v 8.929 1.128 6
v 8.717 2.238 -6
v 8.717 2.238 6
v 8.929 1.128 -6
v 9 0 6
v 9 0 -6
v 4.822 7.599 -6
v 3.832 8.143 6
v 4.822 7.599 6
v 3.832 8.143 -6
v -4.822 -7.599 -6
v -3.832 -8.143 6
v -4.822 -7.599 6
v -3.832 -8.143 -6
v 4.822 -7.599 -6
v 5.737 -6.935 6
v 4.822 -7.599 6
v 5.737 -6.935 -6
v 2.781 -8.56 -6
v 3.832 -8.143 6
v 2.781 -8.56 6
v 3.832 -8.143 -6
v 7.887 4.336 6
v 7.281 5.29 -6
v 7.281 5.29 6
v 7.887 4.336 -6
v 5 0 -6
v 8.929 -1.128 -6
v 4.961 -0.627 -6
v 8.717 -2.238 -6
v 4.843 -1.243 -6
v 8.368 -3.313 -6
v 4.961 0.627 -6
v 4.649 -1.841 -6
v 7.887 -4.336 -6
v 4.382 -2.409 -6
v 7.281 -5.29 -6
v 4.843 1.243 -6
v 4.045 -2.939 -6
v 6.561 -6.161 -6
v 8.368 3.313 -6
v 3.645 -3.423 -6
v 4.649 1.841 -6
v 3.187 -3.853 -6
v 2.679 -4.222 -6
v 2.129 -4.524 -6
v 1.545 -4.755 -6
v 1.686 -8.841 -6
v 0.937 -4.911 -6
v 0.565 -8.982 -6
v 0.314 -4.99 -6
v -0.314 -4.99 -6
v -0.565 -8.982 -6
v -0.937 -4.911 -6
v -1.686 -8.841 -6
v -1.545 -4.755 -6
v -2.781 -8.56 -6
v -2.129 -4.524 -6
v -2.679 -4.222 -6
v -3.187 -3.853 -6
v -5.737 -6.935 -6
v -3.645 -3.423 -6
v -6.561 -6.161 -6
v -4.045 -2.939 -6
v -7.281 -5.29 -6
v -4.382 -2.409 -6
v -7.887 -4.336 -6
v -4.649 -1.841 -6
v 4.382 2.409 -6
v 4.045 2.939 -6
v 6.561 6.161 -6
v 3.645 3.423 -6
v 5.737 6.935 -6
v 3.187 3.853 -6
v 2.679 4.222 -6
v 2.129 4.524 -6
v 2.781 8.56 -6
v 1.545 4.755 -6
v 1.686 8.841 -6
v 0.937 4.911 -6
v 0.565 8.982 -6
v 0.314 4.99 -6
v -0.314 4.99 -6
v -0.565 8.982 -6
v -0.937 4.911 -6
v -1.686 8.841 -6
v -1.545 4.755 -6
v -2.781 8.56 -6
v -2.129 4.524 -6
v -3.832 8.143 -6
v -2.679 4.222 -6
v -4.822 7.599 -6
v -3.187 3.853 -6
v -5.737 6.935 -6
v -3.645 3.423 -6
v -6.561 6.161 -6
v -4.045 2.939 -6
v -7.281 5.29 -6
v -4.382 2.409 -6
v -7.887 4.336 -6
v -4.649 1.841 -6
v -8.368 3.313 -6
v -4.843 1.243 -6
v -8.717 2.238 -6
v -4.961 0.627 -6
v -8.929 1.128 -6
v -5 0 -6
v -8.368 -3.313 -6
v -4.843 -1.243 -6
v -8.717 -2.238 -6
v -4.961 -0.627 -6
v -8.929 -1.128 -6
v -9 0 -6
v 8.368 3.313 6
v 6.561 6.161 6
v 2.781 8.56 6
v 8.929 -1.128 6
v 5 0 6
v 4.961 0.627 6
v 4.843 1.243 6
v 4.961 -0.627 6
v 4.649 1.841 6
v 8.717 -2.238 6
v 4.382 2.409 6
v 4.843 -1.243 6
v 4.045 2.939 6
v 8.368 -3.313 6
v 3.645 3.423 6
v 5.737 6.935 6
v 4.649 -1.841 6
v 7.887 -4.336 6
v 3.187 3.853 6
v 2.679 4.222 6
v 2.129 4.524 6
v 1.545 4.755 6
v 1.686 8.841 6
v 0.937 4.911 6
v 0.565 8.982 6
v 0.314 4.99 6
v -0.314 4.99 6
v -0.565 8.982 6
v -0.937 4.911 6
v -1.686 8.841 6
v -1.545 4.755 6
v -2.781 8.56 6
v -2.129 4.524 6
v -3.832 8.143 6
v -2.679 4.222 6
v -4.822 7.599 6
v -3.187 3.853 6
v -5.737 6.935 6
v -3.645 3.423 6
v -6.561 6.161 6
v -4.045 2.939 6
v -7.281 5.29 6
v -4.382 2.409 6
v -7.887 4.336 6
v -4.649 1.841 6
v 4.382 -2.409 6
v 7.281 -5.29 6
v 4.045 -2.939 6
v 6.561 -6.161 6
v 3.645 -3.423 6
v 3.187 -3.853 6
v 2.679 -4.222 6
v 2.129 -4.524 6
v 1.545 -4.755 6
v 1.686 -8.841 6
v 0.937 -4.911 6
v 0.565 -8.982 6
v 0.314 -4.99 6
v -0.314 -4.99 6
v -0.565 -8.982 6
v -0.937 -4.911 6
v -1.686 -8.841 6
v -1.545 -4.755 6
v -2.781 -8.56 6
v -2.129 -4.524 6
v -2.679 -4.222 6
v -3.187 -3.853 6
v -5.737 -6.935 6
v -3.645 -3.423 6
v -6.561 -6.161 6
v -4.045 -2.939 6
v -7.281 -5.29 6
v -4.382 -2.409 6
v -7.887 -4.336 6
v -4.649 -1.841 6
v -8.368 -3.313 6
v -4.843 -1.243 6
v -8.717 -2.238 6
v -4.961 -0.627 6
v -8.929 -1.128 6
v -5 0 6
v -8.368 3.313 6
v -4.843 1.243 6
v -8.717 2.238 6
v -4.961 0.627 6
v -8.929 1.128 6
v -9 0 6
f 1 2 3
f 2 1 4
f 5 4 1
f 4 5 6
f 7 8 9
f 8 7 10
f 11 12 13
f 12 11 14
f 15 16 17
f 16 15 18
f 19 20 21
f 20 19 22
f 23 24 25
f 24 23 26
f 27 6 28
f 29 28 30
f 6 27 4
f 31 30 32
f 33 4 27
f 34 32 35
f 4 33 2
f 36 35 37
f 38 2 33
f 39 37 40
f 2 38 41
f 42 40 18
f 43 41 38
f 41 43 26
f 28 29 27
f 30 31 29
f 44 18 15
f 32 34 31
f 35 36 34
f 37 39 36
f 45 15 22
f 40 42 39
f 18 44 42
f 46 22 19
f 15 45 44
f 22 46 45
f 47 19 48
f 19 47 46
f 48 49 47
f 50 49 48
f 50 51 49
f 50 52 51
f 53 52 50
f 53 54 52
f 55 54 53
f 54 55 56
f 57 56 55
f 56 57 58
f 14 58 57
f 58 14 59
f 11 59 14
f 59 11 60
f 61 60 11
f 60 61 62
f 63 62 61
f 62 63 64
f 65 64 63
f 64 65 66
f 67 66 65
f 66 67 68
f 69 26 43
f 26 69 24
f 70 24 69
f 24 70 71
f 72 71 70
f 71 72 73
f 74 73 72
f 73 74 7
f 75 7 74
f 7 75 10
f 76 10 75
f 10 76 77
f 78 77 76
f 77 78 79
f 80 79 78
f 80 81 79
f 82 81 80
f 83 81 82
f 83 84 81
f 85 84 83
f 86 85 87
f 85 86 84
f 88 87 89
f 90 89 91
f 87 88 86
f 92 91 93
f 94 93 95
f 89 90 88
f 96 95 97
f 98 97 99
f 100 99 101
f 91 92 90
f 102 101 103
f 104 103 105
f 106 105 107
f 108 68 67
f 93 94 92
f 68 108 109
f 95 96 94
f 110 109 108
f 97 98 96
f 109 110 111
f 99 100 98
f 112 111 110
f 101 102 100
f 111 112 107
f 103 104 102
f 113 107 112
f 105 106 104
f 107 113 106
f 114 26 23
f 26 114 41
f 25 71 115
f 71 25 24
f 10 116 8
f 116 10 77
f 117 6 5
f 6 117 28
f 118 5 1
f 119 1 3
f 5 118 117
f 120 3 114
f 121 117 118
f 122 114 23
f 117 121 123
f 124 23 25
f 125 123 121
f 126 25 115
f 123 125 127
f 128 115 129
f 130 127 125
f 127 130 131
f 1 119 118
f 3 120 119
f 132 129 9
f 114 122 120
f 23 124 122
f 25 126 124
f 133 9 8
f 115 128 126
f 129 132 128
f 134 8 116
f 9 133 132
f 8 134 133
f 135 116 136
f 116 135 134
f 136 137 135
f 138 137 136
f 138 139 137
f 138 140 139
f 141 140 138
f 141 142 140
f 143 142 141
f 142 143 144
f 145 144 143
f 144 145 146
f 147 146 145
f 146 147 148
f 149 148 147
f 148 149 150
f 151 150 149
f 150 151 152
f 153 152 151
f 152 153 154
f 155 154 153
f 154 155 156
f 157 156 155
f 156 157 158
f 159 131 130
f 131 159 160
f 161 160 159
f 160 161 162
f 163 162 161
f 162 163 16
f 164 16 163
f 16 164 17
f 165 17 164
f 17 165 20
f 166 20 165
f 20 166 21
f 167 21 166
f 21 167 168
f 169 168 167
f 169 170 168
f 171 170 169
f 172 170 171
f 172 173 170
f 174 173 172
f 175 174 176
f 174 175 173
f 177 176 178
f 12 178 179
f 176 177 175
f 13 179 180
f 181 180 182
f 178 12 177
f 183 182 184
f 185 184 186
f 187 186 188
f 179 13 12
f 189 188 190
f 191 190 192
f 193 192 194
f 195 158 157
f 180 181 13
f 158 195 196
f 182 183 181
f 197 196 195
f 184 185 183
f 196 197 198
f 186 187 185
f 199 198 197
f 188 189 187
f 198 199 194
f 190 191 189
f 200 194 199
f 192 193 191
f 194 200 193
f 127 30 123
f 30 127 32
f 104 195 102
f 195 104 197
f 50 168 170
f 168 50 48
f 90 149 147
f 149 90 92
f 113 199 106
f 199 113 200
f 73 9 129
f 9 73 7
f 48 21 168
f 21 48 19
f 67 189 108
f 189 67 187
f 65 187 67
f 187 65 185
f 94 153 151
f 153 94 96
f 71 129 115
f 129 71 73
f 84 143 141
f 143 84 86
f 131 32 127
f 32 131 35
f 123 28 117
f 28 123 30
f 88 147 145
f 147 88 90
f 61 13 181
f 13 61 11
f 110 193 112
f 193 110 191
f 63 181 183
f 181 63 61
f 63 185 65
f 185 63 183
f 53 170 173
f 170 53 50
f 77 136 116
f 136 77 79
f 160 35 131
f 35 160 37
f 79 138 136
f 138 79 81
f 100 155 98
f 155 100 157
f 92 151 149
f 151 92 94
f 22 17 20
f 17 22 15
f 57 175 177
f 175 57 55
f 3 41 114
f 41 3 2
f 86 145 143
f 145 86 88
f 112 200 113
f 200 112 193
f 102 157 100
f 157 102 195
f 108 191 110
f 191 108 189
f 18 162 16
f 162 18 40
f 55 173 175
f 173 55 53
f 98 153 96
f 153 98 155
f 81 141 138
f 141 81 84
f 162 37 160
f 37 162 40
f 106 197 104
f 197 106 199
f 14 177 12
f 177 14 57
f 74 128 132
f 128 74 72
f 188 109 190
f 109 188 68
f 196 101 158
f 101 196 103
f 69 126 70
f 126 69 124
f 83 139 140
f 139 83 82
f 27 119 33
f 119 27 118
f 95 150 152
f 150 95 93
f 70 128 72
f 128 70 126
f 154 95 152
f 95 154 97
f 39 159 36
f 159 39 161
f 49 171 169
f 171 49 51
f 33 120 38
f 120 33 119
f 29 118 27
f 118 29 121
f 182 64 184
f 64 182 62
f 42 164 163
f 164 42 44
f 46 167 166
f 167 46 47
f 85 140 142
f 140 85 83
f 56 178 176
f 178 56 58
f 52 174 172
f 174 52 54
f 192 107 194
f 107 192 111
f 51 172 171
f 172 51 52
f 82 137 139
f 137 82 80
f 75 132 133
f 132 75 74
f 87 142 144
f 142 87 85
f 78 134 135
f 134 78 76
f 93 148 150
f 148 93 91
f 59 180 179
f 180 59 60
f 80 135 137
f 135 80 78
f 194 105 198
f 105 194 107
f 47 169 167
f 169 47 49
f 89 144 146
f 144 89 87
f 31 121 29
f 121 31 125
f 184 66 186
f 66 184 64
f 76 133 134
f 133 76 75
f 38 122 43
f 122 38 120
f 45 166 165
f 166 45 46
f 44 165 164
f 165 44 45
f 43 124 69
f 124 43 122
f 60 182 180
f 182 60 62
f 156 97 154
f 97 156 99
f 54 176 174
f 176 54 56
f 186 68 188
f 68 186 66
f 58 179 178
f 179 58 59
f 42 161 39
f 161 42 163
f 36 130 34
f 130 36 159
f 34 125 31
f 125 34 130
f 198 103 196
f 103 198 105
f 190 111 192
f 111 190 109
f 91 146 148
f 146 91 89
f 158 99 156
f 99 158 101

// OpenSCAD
$fn = 50;


difference() {
	union() {
		translate(v = [0, 0, -6.0000000000]) {
			cylinder(h = 12, r = 9.0000000000);
		}
	}
	union() {
		translate(v = [0, 0, -100.0000000000]) {
			cylinder(h = 200, r = 5.0000000000);
		}
	}
}
